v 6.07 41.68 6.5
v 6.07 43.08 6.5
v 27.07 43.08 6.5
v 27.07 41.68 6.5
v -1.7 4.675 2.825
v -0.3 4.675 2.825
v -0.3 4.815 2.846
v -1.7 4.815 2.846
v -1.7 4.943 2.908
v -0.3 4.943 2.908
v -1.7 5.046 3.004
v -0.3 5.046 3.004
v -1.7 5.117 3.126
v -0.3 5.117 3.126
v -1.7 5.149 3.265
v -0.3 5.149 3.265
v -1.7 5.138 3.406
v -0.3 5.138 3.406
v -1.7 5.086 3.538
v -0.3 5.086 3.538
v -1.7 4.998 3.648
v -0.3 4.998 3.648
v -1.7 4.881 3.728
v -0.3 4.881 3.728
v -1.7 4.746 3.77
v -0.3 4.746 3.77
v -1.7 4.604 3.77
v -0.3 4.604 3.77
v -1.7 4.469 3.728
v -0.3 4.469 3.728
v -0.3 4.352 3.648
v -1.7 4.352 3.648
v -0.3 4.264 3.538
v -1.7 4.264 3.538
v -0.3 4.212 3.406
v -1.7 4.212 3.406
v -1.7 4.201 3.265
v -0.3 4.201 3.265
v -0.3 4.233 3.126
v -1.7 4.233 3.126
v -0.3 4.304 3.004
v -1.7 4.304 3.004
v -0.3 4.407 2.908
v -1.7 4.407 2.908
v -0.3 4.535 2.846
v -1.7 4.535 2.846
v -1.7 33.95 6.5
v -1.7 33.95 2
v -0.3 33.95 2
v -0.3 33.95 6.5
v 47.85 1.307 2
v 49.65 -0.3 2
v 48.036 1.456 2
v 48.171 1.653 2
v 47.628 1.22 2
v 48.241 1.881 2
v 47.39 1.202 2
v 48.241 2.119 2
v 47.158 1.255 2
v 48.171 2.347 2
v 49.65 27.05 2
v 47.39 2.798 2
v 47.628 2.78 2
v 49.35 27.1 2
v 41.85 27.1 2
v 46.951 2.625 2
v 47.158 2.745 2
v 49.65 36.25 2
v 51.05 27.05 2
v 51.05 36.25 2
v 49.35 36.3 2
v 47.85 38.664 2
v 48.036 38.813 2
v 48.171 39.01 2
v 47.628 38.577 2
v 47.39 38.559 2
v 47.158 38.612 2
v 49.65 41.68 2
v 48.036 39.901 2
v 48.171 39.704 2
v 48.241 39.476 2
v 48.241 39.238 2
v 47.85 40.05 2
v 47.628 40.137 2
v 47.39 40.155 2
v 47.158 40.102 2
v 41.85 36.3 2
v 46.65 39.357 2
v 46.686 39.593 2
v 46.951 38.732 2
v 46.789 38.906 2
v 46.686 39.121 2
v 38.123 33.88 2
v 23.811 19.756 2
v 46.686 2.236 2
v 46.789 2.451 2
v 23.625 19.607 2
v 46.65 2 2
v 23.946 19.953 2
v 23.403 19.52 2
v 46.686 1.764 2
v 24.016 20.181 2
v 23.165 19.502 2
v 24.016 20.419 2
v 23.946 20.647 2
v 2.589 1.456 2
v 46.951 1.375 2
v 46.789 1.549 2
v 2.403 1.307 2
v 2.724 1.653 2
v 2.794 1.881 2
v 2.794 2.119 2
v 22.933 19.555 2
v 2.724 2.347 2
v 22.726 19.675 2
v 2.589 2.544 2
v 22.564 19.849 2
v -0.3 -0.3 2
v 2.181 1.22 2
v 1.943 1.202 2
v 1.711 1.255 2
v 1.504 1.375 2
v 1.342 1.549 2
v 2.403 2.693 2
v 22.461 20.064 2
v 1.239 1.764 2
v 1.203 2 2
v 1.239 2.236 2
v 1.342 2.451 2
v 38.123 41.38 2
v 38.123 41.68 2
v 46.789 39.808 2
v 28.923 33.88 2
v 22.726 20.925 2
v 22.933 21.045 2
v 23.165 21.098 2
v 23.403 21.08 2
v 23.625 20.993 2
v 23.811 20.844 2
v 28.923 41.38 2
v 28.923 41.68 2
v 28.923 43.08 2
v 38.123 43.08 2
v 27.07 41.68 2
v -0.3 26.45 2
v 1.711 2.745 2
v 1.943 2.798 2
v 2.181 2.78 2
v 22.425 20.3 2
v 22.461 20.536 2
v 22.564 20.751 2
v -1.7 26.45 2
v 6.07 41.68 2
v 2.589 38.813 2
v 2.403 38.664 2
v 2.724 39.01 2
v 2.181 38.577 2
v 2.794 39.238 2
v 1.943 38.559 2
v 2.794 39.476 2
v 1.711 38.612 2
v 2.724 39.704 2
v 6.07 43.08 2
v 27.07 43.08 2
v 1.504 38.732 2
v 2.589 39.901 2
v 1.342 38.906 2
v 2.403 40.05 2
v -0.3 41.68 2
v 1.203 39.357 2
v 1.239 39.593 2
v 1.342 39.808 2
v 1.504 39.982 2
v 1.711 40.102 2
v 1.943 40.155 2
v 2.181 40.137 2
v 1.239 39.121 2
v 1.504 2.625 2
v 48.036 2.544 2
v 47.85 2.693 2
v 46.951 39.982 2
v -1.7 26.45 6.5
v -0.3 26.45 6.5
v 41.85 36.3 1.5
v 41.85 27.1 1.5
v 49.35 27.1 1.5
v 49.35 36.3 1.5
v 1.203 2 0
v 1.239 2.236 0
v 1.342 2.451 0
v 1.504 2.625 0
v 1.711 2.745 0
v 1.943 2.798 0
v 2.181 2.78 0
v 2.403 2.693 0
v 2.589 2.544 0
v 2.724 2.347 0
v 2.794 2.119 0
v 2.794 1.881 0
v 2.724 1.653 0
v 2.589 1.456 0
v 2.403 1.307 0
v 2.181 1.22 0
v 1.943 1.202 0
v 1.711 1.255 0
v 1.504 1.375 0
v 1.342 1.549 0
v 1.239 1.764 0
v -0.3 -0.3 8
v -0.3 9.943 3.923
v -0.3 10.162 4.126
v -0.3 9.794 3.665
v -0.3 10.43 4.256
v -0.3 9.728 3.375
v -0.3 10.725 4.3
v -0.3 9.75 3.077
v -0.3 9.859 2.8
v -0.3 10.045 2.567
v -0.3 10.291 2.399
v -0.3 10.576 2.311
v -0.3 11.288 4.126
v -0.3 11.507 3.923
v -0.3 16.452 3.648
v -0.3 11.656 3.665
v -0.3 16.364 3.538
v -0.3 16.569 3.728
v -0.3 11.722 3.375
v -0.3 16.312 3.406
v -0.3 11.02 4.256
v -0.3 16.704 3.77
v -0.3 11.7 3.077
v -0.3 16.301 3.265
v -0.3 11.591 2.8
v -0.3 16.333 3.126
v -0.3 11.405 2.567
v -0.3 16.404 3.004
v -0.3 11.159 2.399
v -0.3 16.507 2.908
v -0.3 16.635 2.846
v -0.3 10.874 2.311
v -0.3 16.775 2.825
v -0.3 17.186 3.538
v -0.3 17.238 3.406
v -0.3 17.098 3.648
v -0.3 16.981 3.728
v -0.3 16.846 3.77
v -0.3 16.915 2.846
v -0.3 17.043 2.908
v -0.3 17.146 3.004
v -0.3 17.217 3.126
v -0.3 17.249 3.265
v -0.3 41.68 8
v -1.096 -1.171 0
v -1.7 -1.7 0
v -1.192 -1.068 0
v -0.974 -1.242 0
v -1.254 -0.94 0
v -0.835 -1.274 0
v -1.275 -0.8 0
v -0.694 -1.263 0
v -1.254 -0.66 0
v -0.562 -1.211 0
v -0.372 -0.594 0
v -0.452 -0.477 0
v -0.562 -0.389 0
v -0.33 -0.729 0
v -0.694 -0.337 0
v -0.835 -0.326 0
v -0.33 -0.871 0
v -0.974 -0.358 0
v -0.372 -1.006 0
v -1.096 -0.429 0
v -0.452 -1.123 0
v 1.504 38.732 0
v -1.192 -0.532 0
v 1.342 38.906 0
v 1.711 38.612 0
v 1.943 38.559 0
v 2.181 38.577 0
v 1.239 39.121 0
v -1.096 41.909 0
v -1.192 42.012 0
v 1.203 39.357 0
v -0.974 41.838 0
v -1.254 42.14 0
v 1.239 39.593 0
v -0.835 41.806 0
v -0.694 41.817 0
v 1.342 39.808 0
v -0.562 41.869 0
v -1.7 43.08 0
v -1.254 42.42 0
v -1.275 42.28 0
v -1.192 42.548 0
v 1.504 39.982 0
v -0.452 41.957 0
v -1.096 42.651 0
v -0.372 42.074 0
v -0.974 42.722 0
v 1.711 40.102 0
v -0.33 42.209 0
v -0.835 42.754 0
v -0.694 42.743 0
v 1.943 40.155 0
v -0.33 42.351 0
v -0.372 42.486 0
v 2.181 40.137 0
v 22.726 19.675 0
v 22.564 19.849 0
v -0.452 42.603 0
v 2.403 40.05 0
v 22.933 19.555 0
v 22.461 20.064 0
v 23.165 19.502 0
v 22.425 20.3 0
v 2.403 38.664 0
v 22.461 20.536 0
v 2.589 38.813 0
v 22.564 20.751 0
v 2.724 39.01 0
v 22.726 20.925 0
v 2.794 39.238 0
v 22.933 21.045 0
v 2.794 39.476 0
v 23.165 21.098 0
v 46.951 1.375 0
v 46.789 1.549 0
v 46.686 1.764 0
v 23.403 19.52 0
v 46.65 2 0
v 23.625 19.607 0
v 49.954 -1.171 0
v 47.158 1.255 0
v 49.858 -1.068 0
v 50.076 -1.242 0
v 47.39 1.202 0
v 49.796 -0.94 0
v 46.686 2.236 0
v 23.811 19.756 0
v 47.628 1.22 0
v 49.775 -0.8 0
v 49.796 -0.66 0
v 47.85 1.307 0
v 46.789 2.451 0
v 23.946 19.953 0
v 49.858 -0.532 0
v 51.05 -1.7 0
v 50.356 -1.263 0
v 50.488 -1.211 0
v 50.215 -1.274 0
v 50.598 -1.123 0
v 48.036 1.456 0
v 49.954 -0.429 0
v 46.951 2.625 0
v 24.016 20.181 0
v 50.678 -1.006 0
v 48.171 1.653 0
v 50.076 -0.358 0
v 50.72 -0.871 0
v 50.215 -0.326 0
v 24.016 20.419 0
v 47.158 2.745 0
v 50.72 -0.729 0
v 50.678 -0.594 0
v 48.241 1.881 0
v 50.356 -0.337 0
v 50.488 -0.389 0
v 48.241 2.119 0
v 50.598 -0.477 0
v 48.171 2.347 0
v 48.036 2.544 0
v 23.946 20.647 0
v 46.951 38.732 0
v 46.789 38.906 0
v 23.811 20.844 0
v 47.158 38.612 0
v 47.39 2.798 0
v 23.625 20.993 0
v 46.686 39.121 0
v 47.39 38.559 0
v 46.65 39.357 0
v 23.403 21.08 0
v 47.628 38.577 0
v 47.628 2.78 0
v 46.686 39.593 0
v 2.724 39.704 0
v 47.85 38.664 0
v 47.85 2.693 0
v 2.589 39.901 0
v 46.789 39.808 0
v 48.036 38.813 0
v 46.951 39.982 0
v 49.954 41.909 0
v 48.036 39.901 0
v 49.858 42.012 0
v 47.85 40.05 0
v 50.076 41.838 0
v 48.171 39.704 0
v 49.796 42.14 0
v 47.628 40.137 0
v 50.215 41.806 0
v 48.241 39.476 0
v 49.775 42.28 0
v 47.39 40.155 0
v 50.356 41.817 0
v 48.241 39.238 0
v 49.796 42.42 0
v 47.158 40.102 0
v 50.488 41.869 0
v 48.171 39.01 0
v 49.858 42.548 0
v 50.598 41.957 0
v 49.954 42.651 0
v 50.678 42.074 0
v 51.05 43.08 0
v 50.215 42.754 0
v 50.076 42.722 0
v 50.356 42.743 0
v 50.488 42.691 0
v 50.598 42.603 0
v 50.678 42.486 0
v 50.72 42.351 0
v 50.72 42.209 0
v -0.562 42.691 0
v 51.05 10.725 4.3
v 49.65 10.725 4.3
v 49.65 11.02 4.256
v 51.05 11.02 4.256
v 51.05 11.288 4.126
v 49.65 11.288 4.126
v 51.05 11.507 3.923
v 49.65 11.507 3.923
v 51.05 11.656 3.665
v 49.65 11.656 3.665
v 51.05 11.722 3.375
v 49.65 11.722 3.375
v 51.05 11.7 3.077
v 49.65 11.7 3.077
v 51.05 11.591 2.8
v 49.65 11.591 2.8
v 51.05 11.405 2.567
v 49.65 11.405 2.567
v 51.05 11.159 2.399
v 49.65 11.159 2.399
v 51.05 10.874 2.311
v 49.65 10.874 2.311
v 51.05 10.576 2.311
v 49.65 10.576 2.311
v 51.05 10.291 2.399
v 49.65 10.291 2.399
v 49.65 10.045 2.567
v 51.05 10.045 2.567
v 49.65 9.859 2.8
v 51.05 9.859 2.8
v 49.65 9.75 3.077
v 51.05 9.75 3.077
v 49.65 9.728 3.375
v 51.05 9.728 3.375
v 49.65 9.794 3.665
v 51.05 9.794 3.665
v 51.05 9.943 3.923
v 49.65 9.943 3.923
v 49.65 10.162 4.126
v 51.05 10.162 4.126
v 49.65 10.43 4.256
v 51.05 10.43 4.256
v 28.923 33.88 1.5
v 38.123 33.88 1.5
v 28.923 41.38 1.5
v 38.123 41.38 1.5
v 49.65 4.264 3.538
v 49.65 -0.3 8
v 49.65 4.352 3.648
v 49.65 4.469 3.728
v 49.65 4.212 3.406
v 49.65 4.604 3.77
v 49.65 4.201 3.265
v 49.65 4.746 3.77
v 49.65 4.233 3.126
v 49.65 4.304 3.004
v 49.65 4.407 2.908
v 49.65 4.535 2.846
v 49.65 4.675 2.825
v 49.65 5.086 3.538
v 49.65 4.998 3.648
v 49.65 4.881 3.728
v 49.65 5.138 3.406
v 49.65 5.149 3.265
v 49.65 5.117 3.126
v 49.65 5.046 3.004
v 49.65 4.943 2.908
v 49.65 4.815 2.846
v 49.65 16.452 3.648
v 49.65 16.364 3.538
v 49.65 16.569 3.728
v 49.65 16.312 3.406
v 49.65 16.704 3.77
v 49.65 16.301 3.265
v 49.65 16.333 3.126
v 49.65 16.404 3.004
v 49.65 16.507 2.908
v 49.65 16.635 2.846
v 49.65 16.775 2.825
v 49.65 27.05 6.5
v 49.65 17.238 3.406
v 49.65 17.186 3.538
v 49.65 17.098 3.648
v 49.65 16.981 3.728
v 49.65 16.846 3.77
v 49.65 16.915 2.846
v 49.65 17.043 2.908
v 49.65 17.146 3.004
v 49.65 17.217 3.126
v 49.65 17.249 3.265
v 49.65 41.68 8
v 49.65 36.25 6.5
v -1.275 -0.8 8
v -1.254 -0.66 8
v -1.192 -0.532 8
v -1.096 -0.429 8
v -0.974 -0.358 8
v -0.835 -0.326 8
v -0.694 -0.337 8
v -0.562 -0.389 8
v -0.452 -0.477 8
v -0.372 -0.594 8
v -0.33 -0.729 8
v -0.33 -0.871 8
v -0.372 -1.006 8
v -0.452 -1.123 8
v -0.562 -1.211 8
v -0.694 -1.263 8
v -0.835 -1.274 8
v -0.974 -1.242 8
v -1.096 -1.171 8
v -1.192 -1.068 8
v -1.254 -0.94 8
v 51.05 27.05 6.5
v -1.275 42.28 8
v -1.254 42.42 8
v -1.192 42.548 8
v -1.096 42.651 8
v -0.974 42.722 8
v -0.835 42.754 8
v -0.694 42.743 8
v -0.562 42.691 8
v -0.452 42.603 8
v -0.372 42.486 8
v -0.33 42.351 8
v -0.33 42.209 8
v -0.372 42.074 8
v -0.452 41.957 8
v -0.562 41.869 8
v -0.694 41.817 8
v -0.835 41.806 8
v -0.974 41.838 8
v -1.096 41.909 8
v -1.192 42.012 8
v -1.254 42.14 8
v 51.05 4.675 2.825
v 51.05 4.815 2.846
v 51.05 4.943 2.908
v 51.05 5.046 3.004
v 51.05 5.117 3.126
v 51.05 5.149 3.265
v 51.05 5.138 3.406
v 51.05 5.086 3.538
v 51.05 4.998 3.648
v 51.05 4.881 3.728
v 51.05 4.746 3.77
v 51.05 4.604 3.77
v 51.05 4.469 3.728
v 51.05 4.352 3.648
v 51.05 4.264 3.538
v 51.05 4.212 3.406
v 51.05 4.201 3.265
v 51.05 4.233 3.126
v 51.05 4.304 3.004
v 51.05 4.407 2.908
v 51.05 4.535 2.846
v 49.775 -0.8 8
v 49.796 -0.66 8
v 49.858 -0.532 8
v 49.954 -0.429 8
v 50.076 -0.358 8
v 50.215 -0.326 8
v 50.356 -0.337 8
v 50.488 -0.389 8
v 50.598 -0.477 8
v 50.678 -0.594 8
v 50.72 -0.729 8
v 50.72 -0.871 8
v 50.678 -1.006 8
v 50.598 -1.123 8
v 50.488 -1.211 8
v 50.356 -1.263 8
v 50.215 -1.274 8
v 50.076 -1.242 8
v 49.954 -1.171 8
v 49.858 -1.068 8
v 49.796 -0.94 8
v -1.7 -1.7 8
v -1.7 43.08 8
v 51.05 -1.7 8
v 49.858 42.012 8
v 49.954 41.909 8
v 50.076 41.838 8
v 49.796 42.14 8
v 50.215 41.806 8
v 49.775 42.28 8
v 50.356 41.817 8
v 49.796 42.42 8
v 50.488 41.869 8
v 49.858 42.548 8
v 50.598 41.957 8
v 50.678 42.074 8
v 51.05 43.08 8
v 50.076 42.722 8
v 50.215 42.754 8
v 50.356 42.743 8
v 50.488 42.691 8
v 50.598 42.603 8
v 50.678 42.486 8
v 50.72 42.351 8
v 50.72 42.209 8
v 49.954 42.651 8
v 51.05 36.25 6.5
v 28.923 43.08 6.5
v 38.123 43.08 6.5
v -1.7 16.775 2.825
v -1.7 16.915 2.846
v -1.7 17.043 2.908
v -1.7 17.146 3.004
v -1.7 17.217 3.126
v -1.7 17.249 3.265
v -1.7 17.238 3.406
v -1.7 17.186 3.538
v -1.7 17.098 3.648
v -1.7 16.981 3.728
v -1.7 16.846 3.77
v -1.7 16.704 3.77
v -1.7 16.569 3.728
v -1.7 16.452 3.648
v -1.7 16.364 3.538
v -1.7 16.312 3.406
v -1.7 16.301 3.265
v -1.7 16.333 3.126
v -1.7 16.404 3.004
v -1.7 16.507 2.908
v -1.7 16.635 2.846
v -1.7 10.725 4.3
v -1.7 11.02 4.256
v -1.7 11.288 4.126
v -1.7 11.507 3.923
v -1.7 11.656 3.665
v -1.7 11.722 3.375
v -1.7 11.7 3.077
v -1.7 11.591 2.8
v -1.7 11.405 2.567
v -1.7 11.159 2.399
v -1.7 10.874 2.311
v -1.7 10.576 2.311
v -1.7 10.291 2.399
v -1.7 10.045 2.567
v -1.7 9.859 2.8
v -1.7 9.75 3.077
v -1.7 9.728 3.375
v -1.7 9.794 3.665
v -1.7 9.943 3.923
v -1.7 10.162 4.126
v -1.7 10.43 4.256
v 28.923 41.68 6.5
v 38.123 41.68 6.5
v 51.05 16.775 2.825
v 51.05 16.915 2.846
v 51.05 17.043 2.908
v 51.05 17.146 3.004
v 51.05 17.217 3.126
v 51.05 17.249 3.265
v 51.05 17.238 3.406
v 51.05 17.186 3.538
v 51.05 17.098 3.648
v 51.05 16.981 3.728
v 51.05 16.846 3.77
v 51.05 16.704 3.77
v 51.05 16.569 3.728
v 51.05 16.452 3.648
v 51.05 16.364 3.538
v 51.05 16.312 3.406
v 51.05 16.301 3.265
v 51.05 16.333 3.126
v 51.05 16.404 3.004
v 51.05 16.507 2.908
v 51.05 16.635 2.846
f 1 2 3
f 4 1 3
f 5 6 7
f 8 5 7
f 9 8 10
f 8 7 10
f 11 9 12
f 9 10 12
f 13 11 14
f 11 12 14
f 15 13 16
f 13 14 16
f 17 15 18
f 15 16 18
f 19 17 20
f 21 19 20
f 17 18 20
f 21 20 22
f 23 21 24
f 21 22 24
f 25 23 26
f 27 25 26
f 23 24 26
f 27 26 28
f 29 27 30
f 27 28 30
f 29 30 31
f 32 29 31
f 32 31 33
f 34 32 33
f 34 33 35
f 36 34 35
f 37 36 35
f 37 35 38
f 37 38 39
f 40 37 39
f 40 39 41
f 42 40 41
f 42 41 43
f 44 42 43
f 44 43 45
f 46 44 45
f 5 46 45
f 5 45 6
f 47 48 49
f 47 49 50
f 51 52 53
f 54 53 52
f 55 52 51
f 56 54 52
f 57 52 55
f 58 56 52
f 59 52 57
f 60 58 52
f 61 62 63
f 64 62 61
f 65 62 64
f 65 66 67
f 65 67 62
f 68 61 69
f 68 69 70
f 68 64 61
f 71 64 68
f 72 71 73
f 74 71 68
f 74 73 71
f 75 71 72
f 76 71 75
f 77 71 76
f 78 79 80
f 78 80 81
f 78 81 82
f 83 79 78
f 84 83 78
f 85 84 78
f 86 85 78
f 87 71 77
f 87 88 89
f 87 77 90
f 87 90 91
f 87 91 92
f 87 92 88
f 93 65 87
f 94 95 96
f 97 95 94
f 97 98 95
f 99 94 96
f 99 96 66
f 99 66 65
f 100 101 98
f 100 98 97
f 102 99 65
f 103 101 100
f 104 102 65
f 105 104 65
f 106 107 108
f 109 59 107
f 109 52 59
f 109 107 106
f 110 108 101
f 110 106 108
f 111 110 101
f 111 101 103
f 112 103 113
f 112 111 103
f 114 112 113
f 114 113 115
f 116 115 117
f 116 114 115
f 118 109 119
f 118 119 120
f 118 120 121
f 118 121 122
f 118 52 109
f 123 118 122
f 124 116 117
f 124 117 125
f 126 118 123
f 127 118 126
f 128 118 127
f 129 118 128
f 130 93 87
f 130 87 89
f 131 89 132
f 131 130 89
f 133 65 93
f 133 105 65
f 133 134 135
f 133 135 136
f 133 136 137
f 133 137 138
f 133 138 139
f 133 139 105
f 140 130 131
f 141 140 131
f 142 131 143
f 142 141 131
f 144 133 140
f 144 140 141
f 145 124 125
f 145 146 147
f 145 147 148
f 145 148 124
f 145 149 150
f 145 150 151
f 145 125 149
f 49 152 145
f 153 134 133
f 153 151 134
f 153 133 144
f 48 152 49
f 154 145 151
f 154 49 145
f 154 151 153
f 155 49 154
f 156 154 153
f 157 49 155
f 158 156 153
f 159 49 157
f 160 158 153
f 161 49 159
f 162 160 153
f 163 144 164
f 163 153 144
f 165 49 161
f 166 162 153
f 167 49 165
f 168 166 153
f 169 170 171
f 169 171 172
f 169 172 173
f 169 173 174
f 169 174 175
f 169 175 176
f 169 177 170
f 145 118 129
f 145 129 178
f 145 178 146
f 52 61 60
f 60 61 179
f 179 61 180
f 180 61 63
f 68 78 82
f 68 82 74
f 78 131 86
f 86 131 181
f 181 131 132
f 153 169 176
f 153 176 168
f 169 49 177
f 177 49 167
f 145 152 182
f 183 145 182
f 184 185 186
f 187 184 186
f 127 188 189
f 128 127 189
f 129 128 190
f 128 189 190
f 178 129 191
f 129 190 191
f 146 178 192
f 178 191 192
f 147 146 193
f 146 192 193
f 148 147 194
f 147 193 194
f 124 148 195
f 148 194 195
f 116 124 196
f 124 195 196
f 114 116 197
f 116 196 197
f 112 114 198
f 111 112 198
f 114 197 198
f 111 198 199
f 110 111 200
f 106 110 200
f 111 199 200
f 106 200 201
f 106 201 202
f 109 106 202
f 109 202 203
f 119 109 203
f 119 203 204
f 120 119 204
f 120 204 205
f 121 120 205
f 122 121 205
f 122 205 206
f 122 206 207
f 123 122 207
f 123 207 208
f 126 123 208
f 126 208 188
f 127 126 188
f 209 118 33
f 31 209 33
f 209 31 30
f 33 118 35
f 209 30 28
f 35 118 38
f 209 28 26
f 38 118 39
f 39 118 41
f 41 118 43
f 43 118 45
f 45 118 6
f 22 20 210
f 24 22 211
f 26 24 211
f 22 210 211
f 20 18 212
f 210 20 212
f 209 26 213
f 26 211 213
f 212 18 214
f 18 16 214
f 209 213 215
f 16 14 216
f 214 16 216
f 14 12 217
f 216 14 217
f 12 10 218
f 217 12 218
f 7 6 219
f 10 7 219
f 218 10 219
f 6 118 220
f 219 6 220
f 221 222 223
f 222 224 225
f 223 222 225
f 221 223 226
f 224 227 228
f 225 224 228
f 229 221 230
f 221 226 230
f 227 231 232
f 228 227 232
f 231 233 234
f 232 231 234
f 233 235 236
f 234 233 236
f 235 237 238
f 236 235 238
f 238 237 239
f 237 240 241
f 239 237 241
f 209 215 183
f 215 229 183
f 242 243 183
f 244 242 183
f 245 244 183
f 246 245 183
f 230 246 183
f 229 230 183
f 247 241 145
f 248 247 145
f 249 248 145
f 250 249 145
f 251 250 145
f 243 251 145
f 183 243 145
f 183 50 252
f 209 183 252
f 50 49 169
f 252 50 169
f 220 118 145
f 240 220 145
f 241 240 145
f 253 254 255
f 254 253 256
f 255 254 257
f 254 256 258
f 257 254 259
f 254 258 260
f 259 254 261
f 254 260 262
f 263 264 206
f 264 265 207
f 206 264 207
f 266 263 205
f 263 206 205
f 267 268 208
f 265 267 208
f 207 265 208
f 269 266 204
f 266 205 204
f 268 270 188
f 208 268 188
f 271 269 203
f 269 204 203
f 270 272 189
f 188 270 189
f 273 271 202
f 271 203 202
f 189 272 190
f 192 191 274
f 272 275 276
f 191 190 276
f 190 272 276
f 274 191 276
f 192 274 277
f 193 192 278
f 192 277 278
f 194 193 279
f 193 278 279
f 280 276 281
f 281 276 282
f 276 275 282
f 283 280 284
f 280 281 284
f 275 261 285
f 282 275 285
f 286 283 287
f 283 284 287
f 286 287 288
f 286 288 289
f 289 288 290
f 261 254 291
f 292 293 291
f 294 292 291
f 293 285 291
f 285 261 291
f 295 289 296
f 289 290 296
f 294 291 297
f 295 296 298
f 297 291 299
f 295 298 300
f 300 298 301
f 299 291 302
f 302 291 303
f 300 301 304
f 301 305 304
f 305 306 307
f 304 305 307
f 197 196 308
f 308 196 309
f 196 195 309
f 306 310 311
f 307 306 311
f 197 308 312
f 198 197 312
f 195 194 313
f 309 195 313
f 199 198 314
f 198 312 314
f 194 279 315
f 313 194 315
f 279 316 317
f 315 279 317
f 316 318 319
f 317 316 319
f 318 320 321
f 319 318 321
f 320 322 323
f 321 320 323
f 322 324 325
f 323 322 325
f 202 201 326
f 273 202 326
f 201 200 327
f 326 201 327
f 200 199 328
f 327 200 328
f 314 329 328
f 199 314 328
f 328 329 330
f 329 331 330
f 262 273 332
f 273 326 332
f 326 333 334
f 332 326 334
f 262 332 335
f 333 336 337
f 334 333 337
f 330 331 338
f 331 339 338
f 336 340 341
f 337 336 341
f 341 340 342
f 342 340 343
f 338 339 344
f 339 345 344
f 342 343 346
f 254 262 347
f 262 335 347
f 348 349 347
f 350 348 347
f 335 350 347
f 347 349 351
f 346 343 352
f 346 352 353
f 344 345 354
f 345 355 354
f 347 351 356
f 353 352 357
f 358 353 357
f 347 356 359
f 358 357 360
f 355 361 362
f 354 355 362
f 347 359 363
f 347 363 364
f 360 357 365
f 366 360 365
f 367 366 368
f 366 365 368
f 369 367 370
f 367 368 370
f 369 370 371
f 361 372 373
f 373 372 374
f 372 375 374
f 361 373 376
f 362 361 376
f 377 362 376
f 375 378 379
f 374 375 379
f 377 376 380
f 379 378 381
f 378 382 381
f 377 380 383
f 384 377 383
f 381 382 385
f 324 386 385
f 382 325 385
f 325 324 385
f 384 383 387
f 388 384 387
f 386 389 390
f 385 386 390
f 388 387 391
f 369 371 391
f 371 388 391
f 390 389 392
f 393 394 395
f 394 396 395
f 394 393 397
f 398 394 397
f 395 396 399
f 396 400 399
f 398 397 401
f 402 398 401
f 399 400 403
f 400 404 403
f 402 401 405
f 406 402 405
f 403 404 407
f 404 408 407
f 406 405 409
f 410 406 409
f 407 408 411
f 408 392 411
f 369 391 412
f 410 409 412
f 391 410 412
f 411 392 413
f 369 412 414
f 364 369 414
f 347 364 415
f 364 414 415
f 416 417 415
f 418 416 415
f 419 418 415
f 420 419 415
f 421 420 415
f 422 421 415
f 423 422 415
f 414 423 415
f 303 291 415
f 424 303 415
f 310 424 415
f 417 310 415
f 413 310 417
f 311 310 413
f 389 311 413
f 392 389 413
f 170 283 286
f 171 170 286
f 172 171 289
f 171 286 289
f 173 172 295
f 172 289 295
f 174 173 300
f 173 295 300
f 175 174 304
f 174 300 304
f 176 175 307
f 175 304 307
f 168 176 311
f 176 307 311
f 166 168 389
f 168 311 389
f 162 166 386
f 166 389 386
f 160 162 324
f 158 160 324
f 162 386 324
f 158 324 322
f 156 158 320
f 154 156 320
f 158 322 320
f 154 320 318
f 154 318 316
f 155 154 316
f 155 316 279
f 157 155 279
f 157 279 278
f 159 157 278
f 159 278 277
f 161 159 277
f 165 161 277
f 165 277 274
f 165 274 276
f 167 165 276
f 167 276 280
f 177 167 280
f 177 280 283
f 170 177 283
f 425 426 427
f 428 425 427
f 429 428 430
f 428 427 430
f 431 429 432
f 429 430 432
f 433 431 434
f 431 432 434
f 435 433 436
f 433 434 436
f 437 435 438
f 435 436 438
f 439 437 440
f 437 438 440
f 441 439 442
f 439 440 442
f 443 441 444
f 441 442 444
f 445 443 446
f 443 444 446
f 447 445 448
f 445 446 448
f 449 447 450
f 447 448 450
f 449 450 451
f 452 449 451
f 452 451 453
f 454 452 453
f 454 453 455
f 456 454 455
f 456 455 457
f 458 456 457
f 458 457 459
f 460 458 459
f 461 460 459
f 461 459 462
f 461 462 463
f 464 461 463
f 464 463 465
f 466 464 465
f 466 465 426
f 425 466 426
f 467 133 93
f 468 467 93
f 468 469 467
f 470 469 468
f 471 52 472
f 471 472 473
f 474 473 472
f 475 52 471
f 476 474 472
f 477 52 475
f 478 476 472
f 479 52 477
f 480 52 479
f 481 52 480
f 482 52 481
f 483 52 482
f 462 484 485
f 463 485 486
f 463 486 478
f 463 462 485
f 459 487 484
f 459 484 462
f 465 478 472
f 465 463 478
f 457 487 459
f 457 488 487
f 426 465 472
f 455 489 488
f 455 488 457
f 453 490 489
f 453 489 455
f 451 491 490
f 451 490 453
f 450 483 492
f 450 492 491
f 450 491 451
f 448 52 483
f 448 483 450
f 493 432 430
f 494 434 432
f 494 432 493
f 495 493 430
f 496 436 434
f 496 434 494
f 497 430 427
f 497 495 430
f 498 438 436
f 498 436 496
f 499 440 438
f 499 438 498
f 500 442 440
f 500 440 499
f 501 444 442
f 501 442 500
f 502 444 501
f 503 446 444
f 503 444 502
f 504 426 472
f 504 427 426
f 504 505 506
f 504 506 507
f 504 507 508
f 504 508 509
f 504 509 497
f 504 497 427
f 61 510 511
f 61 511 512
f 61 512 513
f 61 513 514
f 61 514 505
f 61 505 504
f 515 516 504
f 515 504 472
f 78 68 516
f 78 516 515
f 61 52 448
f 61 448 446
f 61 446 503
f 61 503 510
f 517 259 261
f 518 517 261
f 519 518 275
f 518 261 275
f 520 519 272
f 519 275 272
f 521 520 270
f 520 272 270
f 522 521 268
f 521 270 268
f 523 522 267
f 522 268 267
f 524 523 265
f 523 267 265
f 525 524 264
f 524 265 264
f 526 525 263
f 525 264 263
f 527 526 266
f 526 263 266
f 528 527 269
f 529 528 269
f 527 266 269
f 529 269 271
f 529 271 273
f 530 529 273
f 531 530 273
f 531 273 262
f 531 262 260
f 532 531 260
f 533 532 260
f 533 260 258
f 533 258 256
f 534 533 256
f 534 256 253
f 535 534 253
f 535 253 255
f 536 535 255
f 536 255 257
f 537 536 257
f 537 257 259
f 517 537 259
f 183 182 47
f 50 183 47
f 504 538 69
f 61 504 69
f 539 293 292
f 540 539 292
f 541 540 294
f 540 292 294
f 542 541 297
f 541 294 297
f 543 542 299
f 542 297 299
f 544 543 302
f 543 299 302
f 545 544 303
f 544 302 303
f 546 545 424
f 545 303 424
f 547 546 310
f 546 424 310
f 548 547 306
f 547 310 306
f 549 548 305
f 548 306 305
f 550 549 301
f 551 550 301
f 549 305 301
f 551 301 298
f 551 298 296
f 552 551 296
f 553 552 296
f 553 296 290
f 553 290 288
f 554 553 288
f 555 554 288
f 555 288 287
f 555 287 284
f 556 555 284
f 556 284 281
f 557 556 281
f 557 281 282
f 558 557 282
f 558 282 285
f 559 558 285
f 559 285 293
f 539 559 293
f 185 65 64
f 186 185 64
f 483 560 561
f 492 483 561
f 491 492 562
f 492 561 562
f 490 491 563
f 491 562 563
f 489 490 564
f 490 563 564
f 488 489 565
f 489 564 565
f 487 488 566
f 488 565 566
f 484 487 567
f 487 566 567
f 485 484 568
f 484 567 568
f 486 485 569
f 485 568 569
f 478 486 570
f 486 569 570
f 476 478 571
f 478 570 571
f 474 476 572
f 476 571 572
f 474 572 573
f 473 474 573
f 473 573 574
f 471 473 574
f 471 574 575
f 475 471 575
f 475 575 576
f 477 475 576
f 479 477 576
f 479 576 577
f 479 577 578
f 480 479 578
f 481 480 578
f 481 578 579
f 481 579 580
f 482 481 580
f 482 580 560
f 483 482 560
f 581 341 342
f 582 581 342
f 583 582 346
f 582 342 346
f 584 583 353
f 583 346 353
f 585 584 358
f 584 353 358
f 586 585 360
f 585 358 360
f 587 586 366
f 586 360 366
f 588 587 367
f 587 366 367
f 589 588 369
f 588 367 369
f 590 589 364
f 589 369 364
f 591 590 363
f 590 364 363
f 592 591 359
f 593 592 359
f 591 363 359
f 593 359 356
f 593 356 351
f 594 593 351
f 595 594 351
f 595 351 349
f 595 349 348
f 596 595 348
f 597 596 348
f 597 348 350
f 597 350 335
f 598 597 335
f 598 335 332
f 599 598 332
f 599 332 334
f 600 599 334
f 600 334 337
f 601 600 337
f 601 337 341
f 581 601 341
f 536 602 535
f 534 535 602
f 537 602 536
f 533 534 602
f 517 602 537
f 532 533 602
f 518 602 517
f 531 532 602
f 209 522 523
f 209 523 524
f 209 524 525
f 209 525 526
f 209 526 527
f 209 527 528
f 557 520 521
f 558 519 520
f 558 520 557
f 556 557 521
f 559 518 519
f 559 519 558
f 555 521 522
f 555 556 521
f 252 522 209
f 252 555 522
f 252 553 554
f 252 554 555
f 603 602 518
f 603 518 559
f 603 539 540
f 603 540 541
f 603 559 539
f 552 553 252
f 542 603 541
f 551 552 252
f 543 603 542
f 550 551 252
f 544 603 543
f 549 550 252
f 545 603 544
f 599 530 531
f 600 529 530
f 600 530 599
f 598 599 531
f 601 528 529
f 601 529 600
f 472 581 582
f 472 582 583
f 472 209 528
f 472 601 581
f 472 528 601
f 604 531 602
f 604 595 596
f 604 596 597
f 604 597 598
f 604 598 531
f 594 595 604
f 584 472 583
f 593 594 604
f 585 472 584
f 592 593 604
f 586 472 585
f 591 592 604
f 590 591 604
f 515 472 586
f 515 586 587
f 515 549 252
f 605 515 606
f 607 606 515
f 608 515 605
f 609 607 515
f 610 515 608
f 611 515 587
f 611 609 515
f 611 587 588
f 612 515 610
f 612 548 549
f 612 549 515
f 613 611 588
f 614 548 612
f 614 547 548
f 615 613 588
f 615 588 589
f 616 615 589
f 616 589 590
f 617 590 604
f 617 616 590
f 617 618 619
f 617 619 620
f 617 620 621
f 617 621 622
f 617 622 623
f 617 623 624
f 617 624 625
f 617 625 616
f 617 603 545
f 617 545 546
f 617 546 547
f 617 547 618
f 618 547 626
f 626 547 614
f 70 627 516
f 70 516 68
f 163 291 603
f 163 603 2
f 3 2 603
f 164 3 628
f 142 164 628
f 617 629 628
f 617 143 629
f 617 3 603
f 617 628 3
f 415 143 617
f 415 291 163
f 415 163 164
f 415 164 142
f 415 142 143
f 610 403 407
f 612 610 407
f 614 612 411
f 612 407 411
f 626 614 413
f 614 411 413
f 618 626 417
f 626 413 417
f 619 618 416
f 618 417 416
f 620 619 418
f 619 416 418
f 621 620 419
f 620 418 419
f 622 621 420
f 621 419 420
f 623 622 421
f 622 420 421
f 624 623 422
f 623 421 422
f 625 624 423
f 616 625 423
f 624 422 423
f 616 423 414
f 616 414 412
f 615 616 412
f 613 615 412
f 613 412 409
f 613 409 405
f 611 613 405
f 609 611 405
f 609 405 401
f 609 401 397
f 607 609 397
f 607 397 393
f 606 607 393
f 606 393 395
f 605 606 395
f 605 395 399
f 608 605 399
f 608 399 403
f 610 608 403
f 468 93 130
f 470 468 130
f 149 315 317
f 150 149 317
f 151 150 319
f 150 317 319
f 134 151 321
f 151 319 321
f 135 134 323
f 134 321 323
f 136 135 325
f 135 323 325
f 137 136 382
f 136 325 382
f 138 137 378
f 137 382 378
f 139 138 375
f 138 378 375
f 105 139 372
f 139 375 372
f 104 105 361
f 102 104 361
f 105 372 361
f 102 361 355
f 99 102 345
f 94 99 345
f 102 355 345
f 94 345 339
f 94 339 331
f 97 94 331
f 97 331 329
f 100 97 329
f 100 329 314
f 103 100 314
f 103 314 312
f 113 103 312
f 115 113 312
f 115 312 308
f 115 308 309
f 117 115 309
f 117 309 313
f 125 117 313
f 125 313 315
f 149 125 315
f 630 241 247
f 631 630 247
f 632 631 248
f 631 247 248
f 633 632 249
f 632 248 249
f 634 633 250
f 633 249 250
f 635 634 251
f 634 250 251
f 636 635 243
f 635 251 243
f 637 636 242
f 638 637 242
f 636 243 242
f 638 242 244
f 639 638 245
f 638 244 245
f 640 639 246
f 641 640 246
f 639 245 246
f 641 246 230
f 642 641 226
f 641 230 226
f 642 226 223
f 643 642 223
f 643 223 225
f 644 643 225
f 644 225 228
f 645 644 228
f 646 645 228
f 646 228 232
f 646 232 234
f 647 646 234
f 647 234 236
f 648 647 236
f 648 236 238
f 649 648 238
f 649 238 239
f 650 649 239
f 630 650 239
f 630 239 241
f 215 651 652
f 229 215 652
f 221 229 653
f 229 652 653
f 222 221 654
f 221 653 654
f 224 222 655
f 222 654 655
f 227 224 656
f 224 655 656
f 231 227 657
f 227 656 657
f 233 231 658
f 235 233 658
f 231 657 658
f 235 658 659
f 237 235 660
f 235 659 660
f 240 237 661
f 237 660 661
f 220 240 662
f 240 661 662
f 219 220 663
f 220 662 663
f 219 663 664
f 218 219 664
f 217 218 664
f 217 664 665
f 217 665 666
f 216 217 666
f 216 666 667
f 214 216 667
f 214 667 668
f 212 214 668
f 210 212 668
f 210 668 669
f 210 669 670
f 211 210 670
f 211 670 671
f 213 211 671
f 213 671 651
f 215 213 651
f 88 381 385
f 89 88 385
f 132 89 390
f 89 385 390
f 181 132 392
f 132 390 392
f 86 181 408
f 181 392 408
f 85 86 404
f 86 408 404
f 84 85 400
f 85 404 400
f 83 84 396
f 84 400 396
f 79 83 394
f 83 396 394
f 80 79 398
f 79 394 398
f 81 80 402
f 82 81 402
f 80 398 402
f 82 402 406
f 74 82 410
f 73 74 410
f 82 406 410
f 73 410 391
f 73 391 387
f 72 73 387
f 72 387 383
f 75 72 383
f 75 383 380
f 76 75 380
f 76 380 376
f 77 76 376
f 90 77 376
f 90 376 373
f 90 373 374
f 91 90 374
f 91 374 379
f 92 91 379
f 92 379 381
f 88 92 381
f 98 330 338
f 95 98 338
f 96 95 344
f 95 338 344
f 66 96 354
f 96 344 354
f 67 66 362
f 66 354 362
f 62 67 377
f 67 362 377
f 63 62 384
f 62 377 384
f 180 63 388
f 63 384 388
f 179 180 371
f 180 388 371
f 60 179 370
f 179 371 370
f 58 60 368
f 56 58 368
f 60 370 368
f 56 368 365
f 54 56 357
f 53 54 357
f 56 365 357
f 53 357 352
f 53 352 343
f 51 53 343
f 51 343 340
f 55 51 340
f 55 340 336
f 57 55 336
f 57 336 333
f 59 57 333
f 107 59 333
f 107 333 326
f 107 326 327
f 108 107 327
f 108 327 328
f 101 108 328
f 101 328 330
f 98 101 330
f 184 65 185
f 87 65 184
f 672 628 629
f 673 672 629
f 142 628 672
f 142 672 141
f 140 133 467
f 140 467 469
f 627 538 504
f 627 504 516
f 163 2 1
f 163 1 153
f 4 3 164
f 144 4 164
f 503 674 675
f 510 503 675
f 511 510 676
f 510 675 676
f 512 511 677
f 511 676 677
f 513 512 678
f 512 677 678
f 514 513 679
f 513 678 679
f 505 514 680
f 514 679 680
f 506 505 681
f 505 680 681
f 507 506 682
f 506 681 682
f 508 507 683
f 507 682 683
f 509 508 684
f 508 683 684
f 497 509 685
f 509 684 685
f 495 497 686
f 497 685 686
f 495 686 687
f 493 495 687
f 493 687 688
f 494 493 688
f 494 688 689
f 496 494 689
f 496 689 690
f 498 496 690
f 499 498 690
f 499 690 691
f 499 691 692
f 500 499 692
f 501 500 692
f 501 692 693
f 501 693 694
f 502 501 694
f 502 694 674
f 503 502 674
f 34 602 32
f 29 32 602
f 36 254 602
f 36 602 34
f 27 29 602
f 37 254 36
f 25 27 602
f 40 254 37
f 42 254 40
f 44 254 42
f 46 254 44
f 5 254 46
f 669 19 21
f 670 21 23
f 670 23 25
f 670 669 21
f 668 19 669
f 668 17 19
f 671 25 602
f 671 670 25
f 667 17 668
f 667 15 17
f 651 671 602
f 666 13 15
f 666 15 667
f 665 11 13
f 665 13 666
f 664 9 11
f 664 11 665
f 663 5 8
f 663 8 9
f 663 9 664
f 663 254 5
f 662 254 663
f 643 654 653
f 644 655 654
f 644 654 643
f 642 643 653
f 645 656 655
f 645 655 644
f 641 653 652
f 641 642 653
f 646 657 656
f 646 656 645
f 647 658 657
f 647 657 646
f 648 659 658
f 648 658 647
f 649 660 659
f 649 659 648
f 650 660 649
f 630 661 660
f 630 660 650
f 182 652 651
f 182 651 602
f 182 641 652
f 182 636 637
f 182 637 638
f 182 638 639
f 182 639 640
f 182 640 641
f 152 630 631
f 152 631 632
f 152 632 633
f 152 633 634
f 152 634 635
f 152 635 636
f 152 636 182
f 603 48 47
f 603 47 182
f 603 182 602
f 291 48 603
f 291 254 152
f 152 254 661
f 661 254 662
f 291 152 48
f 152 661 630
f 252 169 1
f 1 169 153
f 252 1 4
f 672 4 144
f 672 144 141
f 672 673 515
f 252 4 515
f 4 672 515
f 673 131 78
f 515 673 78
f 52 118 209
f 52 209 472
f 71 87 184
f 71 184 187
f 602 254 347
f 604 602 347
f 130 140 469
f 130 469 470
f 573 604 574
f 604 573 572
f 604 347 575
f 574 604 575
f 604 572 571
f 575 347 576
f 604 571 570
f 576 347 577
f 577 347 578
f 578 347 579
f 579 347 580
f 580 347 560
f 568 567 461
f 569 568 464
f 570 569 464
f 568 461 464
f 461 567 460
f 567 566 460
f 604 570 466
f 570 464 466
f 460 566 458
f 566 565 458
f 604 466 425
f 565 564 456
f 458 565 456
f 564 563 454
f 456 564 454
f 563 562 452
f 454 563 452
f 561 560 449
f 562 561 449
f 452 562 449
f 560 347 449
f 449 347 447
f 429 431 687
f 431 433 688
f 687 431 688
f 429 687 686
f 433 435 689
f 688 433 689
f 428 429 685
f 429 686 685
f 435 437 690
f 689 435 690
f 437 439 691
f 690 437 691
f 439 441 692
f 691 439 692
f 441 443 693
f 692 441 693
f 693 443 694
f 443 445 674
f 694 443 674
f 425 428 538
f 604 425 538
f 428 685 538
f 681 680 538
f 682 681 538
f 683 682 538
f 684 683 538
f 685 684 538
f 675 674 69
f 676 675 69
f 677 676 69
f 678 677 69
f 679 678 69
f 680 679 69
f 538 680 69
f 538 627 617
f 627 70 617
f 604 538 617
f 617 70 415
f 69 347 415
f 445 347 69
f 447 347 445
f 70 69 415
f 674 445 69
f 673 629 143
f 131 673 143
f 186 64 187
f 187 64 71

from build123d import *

# Parameters (mm, degrees)
SKETCH_3_W          = 52.75
SKETCH_3_H          = 44.78
EXTRUDE_1_DEPTH     = 2
HOLE_WIZARD_M2_1_D  = 1.6
CUT_EXTRUDE_START   = 2
SKETCH_3_5_W        = 9.2
SKETCH_3_5_H        = 7.5
SKETCH_3_5_W_2      = 7.5
SKETCH_3_5_H_2      = 9.2
CUT_EXTRUDE_2_DEPTH = 0.5
SKETCH_3_6_W        = 52.75
SKETCH_3_6_H        = 44.78
SKETCH_3_6_W_2      = 49.95
SKETCH_3_6_H_2      = 41.98
EXTRUDE_3_DEPTH     = 8
SKETCH_10_R         = 1
CUT_EXTRUDE_5_DEPTH = 69.574404117
M1_2X0_25_1_D       = 0.95
SKETCH_13_W         = 4.5
SKETCH_13_H         = 9.2
CUT_EXTRUDE_6_DEPTH = 2
SKETCH_14_W         = 9.2
SKETCH_14_H         = 4.5
SKETCH_14_W_2       = 21
CUT_EXTRUDE_7_DEPTH = 2
SKETCH_15_W         = 4.5
SKETCH_15_H         = 7.5
CUT_EXTRUDE_8_DEPTH = 2
M1_2X0_25_2_D       = 0.95


with BuildPart() as part:
    # 草图3 → 凸台-拉伸1 (new body)
    with BuildSketch(Plane.XY):
        with Locations((24.675, 20.69)):
            Rectangle(SKETCH_3_W, SKETCH_3_H)
    extrude(amount=EXTRUDE_1_DEPTH)

    # M2 螺纹孔1 (through all)
    with Locations(Plane(origin=(2.003, 2, 2), x_dir=(1, 0, 0), z_dir=(0, 0, 1))):
        with Locations((0, 0), (45.447, 0), (45.447, 37.357), (0, 37.357), (21.222, 18.3)):
            Hole(HOLE_WIZARD_M2_1_D / 2)

    # 草图3<5> → 切除-拉伸2 (cut)
    with BuildSketch(Plane.XY.offset(CUT_EXTRUDE_START)):
        with Locations((33.523, 37.63)):
            Rectangle(SKETCH_3_5_W, SKETCH_3_5_H)
        with Locations((45.6, 31.7)):
            Rectangle(SKETCH_3_5_W_2, SKETCH_3_5_H_2)
    extrude(amount=-CUT_EXTRUDE_2_DEPTH, mode=Mode.SUBTRACT)

    # 草图3<6> → 凸台-拉伸3 (add)
    with BuildSketch(Plane.XY):
        with Locations((24.675, 20.69)):
            Rectangle(SKETCH_3_6_W, SKETCH_3_6_H)
        with Locations((24.675, 20.69)):
            Rectangle(SKETCH_3_6_W_2, SKETCH_3_6_H_2, mode=Mode.SUBTRACT)
    extrude(amount=EXTRUDE_3_DEPTH)

    # 草图10 → 切除-拉伸5 (cut, through all)
    with BuildSketch(Plane.ZY.offset(1.7)):
        with Locations((3.3, 10.725)):
            Circle(SKETCH_10_R)
    extrude(amount=-CUT_EXTRUDE_5_DEPTH, mode=Mode.SUBTRACT)

    # M1.2x0.25 螺纹孔1 (through all)
    with Locations(Plane.ZY.offset(1.7)):
        with Locations((3.3, 16.775), (3.3, 4.675)):
            Hole(M1_2X0_25_1_D / 2)

    # 草图13 → 切除-拉伸6 (cut)
    with BuildSketch(Plane(origin=(51.05, 0, 0), x_dir=(0, 0, -1), z_dir=(1, 0, 0))):
        with Locations((-4.25, 31.65)):
            Rectangle(SKETCH_13_W, SKETCH_13_H)
    extrude(amount=-CUT_EXTRUDE_6_DEPTH, mode=Mode.SUBTRACT)

    # 草图14 → 切除-拉伸7 (cut)
    with BuildSketch(Plane(origin=(0, 43.08, 0), x_dir=(1, 0, 0), z_dir=(0, 1, 0))):
        with Locations((33.523, -4.25)):
            Rectangle(SKETCH_14_W, SKETCH_14_H)
        with Locations((16.57, -4.25)):
            Rectangle(SKETCH_14_W_2, SKETCH_14_H)
    extrude(amount=-CUT_EXTRUDE_7_DEPTH, mode=Mode.SUBTRACT)

    # 草图15 → 切除-拉伸8 (cut)
    with BuildSketch(Plane.ZY.offset(1.7)):
        with Locations((4.25, 30.2)):
            Rectangle(SKETCH_15_W, SKETCH_15_H)
    extrude(amount=-CUT_EXTRUDE_8_DEPTH, mode=Mode.SUBTRACT)

    # M1.2x0.25 螺纹孔2 (through all)
    with Locations(Plane(origin=(-0.8, -0.8, 8), x_dir=(1, 0, 0), z_dir=(0, 0, 1))):
        with Locations((0, 0), (51.05, 0), (51.05, 43.08), (0, 43.08)):
            Hole(M1_2X0_25_2_D / 2)


solid = part.part
